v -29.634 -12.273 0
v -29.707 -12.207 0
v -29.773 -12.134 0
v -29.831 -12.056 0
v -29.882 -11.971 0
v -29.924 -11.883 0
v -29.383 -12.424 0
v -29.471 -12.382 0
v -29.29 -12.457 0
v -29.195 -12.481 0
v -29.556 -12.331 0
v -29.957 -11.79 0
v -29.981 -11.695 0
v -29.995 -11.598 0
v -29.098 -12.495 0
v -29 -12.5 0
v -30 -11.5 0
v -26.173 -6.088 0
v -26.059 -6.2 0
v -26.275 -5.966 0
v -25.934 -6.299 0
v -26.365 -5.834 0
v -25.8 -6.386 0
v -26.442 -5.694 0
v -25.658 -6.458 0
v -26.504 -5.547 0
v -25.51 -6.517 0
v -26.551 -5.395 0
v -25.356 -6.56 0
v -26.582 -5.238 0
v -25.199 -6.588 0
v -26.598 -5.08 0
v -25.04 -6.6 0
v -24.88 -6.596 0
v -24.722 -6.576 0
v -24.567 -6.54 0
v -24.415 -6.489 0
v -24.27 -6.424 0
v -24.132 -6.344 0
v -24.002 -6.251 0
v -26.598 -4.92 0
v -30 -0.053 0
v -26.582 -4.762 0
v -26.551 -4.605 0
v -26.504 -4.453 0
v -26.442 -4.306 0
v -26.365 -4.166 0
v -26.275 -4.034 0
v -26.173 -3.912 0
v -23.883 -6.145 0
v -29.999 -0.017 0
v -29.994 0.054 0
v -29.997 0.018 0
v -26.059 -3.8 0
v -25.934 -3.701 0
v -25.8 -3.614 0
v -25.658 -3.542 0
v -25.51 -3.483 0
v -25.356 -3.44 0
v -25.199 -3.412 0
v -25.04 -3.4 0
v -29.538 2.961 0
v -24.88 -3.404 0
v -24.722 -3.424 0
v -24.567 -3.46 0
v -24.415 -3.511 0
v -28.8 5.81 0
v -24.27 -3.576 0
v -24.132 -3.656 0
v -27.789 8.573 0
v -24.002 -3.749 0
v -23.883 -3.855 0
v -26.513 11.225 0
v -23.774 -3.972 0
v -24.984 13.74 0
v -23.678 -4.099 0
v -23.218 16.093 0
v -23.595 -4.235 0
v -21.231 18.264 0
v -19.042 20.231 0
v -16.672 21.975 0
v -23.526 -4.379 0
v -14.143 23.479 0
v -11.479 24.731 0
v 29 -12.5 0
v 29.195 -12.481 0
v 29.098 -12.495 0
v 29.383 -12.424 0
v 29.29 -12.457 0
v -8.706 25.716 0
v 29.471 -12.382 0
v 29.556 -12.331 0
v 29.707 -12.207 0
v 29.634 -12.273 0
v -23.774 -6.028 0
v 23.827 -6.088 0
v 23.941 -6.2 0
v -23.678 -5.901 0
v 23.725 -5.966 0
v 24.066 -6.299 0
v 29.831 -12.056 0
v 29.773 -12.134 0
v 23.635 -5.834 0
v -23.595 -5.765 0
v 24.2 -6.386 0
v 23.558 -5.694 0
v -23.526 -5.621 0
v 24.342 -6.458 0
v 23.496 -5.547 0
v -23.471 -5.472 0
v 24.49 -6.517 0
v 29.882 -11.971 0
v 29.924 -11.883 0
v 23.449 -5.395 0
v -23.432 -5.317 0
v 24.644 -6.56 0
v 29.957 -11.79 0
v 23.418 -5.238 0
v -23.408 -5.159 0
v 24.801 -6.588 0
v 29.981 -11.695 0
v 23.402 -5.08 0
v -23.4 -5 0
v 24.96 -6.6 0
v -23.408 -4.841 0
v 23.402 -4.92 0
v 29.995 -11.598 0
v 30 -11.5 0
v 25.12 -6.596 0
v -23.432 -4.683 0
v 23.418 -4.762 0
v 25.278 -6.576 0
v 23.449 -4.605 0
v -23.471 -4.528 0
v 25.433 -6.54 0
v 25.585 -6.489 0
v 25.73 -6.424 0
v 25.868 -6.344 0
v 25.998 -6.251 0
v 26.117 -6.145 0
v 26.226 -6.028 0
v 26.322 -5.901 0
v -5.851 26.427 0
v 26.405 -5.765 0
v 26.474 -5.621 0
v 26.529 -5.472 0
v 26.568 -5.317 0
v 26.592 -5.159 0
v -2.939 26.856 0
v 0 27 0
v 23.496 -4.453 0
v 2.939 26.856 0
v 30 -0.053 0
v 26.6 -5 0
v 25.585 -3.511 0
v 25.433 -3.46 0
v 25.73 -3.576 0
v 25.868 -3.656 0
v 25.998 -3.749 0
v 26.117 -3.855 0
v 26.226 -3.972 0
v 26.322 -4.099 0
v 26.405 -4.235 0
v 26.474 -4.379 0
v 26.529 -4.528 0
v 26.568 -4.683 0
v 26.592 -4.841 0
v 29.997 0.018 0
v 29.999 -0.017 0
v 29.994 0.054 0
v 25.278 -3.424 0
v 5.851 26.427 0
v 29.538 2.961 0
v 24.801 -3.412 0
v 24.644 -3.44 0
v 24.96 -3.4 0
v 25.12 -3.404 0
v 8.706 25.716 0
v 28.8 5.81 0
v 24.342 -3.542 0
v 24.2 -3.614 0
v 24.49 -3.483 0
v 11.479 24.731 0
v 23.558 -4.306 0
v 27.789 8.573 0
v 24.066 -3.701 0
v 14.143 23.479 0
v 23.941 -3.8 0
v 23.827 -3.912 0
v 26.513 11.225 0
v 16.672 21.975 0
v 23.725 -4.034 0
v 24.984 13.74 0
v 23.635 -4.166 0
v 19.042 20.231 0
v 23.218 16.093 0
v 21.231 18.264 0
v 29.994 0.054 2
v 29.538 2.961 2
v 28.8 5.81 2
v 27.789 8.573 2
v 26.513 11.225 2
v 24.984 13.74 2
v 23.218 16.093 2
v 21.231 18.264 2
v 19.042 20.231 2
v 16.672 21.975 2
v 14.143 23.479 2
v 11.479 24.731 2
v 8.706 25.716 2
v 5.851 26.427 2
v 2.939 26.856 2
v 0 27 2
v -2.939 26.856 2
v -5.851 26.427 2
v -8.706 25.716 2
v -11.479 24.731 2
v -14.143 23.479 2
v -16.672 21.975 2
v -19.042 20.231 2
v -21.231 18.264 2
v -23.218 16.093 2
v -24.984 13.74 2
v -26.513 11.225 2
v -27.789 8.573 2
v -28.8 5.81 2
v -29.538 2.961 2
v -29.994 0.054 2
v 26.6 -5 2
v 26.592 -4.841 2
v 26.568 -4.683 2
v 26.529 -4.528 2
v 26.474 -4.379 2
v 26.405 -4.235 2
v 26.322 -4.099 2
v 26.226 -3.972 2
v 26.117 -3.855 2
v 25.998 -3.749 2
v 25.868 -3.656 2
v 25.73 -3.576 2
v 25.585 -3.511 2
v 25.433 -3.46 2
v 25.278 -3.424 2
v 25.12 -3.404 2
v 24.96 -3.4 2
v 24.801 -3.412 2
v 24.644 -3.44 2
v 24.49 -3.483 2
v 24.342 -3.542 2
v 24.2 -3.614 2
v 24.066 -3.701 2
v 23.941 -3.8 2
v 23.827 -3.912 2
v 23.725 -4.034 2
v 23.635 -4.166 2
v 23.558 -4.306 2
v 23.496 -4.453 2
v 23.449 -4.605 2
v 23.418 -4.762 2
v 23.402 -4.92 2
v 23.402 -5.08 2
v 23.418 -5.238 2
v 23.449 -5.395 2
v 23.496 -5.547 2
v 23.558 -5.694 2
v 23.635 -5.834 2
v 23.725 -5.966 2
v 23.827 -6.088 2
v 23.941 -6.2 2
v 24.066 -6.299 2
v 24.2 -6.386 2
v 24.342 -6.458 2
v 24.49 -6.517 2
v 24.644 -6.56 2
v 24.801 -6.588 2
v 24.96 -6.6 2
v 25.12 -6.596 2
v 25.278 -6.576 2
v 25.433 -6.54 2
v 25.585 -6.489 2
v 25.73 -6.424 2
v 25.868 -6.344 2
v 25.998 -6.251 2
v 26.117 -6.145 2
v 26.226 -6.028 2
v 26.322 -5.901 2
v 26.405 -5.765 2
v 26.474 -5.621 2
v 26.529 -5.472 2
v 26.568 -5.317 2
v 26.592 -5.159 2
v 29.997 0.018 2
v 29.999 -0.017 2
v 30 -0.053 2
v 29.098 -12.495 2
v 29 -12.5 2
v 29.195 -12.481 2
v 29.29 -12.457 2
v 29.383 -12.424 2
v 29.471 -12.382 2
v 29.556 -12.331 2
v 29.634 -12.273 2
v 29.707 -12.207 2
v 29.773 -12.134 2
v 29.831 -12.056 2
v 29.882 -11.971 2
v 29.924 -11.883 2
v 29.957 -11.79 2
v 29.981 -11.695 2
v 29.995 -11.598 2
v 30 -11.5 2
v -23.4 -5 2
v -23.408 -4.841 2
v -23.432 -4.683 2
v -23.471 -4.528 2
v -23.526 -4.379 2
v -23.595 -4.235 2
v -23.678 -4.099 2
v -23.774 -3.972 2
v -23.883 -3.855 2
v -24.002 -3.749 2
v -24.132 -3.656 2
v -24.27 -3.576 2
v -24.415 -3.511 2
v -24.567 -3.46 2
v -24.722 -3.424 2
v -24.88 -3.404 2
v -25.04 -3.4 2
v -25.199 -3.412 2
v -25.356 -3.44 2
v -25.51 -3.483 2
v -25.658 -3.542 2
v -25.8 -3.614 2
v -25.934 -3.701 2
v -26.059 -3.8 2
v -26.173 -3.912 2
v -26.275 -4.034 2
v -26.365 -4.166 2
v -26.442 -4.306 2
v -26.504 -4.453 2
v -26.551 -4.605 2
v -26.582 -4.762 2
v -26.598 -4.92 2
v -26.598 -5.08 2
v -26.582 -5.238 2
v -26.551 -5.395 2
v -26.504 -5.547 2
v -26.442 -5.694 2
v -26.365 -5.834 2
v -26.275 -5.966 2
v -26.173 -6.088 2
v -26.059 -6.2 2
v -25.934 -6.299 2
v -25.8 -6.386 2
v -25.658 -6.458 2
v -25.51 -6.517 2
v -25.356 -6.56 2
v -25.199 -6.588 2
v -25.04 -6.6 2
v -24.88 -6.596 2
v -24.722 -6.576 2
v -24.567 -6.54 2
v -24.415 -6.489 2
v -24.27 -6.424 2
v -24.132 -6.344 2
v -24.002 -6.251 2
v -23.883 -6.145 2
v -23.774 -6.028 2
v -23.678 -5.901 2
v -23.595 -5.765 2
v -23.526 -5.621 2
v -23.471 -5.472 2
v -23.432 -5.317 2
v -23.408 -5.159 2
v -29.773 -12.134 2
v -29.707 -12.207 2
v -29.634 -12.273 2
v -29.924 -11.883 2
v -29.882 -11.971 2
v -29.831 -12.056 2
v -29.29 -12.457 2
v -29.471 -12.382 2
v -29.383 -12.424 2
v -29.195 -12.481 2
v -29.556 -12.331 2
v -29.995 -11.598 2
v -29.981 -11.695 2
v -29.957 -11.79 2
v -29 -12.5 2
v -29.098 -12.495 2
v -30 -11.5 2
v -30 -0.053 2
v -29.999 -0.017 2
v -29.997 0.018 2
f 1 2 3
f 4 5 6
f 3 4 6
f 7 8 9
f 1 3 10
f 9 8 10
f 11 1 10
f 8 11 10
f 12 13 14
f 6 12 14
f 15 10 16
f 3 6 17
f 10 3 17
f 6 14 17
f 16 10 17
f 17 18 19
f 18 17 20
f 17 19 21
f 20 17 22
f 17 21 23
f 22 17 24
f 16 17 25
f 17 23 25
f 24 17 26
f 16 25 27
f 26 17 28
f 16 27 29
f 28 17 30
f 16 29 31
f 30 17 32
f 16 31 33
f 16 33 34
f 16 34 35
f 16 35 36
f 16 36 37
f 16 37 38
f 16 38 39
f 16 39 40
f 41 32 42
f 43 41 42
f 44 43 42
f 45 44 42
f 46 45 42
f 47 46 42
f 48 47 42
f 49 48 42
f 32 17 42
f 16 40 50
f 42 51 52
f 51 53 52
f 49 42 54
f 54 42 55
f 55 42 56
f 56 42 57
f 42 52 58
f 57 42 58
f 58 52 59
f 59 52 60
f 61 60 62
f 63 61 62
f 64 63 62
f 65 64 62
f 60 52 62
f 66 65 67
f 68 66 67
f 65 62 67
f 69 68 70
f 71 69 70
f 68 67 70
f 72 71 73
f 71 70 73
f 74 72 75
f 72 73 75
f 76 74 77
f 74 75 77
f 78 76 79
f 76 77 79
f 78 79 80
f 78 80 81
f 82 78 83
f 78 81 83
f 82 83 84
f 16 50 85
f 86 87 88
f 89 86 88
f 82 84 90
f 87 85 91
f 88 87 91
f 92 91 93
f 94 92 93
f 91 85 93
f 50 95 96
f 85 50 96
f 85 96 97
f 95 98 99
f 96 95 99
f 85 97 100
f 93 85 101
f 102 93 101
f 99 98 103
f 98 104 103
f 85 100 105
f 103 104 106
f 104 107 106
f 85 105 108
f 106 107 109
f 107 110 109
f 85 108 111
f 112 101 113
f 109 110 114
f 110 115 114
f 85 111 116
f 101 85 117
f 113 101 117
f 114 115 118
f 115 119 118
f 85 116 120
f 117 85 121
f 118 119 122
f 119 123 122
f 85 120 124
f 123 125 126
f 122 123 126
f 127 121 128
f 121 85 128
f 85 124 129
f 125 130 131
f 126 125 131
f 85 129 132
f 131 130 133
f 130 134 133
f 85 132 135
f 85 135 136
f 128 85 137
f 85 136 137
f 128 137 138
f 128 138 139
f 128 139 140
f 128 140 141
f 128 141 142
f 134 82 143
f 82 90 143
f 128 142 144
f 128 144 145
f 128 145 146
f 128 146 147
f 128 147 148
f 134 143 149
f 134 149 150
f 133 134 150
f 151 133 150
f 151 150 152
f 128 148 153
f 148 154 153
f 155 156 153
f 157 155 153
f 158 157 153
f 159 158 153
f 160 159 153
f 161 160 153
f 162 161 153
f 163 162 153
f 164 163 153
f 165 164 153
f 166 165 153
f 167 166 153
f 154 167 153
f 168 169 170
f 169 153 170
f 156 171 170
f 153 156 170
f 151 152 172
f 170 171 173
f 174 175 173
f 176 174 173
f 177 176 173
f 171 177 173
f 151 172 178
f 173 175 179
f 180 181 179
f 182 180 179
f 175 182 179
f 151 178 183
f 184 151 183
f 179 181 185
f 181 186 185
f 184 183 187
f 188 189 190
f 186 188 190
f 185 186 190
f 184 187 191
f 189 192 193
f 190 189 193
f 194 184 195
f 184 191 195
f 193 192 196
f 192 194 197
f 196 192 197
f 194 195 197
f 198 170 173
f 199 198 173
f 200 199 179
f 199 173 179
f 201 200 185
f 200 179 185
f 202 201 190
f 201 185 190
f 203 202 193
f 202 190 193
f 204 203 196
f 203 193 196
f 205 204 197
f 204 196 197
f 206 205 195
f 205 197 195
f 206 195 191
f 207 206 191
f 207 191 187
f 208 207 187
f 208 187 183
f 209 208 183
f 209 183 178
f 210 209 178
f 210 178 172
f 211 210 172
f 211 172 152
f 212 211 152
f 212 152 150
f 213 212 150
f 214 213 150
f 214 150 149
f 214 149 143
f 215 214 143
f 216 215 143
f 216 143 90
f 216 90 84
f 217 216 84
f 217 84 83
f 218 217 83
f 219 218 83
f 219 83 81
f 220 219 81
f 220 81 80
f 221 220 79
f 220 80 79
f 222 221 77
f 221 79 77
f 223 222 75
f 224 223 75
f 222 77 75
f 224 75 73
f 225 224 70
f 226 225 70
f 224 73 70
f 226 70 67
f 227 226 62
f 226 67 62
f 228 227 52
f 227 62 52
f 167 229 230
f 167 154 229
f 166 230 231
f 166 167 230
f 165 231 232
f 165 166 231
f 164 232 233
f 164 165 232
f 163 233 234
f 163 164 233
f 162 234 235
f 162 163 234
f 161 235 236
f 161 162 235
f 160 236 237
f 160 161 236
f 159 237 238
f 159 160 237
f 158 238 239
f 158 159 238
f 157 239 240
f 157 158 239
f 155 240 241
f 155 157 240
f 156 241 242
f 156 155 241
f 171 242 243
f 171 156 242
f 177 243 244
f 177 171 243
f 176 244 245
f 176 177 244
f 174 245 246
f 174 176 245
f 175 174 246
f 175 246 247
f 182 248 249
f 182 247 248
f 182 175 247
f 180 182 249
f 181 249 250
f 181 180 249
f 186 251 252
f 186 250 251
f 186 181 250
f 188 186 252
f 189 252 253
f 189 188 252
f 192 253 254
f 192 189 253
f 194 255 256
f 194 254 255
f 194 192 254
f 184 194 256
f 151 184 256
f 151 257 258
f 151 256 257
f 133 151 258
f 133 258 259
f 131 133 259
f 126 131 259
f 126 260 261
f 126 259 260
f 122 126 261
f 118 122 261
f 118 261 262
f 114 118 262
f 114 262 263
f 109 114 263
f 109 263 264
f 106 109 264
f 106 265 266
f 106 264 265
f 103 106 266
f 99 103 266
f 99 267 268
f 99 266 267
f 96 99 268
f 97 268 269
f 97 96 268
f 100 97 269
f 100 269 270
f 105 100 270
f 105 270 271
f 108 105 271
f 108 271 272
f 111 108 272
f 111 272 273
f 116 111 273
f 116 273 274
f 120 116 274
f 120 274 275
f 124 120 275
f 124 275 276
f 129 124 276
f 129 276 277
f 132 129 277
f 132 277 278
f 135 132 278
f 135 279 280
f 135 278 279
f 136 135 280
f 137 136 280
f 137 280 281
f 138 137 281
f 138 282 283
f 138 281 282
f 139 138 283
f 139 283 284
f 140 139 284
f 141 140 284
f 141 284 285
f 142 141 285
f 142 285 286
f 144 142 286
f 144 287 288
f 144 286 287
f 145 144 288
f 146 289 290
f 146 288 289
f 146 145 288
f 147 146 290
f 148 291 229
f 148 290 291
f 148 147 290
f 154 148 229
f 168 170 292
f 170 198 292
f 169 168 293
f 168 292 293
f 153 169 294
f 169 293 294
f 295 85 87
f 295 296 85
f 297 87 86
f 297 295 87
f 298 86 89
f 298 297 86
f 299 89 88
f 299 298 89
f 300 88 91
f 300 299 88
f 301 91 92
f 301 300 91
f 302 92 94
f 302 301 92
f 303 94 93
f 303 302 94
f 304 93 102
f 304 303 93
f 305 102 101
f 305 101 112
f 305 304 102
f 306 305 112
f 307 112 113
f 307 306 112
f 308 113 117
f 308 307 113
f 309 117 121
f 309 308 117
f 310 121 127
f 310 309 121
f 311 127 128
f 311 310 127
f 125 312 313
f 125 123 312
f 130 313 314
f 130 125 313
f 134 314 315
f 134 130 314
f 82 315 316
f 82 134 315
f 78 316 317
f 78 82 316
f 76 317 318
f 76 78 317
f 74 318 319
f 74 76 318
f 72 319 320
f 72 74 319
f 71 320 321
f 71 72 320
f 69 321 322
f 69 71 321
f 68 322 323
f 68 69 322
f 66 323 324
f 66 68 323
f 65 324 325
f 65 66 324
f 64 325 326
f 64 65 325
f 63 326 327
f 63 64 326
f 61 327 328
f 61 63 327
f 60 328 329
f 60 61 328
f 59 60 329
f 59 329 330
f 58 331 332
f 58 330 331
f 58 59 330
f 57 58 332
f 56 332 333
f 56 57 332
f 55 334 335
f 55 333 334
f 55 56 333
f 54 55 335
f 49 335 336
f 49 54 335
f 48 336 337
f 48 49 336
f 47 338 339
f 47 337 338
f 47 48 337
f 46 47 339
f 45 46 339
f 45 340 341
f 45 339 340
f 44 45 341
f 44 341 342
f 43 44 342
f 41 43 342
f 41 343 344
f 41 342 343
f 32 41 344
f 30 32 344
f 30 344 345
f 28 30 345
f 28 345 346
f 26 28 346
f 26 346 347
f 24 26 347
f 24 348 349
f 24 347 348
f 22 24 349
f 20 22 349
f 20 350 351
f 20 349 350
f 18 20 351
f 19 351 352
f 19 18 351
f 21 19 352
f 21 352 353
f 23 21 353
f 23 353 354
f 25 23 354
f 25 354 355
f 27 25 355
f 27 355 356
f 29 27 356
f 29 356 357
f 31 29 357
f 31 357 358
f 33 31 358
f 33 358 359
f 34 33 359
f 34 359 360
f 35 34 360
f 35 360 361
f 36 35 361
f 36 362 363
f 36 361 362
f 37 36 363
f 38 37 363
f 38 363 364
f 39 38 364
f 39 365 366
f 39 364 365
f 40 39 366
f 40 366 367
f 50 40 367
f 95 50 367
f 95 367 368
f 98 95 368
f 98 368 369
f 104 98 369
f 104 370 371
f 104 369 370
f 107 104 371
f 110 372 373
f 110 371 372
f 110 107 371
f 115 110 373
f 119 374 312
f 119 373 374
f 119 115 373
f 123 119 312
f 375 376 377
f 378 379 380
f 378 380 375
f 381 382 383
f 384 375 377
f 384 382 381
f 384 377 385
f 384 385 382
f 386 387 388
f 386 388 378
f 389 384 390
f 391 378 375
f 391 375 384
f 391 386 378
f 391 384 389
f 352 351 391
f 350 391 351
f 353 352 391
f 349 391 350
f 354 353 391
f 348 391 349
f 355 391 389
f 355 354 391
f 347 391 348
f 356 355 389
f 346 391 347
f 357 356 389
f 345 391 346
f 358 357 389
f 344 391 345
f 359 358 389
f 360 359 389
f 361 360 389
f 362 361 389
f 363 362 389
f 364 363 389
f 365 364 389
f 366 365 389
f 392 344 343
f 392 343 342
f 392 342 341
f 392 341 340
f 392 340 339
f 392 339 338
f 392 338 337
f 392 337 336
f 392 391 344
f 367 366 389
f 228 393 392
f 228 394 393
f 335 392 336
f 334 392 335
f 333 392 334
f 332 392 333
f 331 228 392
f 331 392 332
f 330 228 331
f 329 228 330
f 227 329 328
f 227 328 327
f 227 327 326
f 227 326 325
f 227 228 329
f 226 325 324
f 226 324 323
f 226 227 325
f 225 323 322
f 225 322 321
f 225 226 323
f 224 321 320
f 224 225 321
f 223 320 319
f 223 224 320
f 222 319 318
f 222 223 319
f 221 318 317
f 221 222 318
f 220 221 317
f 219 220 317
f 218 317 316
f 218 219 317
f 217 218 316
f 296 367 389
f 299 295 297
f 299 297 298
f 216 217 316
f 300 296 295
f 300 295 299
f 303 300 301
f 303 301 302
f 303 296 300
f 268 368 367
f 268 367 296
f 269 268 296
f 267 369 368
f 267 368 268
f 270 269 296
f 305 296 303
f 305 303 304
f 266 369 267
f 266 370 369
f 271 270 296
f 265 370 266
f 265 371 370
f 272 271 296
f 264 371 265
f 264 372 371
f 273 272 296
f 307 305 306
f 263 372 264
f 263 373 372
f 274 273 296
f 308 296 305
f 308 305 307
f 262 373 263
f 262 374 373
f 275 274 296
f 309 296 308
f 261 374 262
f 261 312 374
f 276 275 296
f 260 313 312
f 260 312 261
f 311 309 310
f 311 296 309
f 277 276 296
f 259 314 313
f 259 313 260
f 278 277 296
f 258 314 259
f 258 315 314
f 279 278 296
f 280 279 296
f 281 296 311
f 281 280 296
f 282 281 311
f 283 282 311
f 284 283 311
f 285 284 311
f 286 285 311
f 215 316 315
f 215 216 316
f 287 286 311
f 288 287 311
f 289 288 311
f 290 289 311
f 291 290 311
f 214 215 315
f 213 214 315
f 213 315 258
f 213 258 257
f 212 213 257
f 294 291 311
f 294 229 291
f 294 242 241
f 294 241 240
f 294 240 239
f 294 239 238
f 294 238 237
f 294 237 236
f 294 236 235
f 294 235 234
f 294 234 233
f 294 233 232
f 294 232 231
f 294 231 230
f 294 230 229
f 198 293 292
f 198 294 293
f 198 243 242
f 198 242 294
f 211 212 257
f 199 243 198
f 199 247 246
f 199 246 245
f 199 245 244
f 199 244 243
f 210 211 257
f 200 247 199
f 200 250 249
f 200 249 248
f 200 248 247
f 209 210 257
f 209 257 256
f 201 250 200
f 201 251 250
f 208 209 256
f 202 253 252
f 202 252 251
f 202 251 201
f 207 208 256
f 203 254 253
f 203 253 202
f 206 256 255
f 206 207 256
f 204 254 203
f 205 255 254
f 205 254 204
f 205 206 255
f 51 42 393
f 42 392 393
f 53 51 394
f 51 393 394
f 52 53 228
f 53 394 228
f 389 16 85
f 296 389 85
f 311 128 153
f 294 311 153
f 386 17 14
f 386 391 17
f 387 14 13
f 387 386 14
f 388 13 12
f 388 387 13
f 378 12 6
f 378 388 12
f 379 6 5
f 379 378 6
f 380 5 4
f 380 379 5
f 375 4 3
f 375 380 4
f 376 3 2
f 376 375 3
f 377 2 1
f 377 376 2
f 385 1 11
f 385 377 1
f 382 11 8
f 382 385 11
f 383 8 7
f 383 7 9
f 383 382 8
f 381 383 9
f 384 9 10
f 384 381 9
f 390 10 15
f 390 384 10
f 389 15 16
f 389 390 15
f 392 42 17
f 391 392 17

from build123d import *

# Parameters (mm, degrees)
EXTRUDE_367_DEPTH          = 2
CUT_EXTRUDE_570_DEPTH      = 41.410394702
CUT_EXTRUDE_570_DEPTH_BACK = 41.410394702
SKETCH_2_R                 = 1.6
FILLET_1_R                 = 1


with BuildPart() as part:
    # Эскиз1 → Extrude 367 (new body)
    with BuildSketch(Plane.XY):
        with BuildLine():
            Line((-30, 0), (-30, -12.5))
            Line((-30, -12.5), (30, -12.5))
            Line((30, -12.5), (30, 0))
            ThreePointArc((30, 0), (0, 27), (-30, 0))
        make_face()
    extrude(amount=EXTRUDE_367_DEPTH)

    # Эскиз2 → Cut-Extrude 570 (cut, two sides: drawn at the far end of the back side and taken through both)
    with BuildSketch(Plane.XY.offset(2).offset(-CUT_EXTRUDE_570_DEPTH_BACK)):
        with Locations((-25, -5)):
            Circle(SKETCH_2_R)
        with Locations((25, -5)):
            Circle(SKETCH_2_R)
    extrude(amount=CUT_EXTRUDE_570_DEPTH + CUT_EXTRUDE_570_DEPTH_BACK, mode=Mode.SUBTRACT)

    # Скругление1
    fillet_1_edges = [part.edges().sort_by_distance(p)[0] for p in [
        (30, 0, 1),
        (30, -12.5, 1),
        (-30, -12.5, 1),
        (-30, 0, 1),
    ]]
    fillet(fillet_1_edges, radius=FILLET_1_R)


solid = part.part
